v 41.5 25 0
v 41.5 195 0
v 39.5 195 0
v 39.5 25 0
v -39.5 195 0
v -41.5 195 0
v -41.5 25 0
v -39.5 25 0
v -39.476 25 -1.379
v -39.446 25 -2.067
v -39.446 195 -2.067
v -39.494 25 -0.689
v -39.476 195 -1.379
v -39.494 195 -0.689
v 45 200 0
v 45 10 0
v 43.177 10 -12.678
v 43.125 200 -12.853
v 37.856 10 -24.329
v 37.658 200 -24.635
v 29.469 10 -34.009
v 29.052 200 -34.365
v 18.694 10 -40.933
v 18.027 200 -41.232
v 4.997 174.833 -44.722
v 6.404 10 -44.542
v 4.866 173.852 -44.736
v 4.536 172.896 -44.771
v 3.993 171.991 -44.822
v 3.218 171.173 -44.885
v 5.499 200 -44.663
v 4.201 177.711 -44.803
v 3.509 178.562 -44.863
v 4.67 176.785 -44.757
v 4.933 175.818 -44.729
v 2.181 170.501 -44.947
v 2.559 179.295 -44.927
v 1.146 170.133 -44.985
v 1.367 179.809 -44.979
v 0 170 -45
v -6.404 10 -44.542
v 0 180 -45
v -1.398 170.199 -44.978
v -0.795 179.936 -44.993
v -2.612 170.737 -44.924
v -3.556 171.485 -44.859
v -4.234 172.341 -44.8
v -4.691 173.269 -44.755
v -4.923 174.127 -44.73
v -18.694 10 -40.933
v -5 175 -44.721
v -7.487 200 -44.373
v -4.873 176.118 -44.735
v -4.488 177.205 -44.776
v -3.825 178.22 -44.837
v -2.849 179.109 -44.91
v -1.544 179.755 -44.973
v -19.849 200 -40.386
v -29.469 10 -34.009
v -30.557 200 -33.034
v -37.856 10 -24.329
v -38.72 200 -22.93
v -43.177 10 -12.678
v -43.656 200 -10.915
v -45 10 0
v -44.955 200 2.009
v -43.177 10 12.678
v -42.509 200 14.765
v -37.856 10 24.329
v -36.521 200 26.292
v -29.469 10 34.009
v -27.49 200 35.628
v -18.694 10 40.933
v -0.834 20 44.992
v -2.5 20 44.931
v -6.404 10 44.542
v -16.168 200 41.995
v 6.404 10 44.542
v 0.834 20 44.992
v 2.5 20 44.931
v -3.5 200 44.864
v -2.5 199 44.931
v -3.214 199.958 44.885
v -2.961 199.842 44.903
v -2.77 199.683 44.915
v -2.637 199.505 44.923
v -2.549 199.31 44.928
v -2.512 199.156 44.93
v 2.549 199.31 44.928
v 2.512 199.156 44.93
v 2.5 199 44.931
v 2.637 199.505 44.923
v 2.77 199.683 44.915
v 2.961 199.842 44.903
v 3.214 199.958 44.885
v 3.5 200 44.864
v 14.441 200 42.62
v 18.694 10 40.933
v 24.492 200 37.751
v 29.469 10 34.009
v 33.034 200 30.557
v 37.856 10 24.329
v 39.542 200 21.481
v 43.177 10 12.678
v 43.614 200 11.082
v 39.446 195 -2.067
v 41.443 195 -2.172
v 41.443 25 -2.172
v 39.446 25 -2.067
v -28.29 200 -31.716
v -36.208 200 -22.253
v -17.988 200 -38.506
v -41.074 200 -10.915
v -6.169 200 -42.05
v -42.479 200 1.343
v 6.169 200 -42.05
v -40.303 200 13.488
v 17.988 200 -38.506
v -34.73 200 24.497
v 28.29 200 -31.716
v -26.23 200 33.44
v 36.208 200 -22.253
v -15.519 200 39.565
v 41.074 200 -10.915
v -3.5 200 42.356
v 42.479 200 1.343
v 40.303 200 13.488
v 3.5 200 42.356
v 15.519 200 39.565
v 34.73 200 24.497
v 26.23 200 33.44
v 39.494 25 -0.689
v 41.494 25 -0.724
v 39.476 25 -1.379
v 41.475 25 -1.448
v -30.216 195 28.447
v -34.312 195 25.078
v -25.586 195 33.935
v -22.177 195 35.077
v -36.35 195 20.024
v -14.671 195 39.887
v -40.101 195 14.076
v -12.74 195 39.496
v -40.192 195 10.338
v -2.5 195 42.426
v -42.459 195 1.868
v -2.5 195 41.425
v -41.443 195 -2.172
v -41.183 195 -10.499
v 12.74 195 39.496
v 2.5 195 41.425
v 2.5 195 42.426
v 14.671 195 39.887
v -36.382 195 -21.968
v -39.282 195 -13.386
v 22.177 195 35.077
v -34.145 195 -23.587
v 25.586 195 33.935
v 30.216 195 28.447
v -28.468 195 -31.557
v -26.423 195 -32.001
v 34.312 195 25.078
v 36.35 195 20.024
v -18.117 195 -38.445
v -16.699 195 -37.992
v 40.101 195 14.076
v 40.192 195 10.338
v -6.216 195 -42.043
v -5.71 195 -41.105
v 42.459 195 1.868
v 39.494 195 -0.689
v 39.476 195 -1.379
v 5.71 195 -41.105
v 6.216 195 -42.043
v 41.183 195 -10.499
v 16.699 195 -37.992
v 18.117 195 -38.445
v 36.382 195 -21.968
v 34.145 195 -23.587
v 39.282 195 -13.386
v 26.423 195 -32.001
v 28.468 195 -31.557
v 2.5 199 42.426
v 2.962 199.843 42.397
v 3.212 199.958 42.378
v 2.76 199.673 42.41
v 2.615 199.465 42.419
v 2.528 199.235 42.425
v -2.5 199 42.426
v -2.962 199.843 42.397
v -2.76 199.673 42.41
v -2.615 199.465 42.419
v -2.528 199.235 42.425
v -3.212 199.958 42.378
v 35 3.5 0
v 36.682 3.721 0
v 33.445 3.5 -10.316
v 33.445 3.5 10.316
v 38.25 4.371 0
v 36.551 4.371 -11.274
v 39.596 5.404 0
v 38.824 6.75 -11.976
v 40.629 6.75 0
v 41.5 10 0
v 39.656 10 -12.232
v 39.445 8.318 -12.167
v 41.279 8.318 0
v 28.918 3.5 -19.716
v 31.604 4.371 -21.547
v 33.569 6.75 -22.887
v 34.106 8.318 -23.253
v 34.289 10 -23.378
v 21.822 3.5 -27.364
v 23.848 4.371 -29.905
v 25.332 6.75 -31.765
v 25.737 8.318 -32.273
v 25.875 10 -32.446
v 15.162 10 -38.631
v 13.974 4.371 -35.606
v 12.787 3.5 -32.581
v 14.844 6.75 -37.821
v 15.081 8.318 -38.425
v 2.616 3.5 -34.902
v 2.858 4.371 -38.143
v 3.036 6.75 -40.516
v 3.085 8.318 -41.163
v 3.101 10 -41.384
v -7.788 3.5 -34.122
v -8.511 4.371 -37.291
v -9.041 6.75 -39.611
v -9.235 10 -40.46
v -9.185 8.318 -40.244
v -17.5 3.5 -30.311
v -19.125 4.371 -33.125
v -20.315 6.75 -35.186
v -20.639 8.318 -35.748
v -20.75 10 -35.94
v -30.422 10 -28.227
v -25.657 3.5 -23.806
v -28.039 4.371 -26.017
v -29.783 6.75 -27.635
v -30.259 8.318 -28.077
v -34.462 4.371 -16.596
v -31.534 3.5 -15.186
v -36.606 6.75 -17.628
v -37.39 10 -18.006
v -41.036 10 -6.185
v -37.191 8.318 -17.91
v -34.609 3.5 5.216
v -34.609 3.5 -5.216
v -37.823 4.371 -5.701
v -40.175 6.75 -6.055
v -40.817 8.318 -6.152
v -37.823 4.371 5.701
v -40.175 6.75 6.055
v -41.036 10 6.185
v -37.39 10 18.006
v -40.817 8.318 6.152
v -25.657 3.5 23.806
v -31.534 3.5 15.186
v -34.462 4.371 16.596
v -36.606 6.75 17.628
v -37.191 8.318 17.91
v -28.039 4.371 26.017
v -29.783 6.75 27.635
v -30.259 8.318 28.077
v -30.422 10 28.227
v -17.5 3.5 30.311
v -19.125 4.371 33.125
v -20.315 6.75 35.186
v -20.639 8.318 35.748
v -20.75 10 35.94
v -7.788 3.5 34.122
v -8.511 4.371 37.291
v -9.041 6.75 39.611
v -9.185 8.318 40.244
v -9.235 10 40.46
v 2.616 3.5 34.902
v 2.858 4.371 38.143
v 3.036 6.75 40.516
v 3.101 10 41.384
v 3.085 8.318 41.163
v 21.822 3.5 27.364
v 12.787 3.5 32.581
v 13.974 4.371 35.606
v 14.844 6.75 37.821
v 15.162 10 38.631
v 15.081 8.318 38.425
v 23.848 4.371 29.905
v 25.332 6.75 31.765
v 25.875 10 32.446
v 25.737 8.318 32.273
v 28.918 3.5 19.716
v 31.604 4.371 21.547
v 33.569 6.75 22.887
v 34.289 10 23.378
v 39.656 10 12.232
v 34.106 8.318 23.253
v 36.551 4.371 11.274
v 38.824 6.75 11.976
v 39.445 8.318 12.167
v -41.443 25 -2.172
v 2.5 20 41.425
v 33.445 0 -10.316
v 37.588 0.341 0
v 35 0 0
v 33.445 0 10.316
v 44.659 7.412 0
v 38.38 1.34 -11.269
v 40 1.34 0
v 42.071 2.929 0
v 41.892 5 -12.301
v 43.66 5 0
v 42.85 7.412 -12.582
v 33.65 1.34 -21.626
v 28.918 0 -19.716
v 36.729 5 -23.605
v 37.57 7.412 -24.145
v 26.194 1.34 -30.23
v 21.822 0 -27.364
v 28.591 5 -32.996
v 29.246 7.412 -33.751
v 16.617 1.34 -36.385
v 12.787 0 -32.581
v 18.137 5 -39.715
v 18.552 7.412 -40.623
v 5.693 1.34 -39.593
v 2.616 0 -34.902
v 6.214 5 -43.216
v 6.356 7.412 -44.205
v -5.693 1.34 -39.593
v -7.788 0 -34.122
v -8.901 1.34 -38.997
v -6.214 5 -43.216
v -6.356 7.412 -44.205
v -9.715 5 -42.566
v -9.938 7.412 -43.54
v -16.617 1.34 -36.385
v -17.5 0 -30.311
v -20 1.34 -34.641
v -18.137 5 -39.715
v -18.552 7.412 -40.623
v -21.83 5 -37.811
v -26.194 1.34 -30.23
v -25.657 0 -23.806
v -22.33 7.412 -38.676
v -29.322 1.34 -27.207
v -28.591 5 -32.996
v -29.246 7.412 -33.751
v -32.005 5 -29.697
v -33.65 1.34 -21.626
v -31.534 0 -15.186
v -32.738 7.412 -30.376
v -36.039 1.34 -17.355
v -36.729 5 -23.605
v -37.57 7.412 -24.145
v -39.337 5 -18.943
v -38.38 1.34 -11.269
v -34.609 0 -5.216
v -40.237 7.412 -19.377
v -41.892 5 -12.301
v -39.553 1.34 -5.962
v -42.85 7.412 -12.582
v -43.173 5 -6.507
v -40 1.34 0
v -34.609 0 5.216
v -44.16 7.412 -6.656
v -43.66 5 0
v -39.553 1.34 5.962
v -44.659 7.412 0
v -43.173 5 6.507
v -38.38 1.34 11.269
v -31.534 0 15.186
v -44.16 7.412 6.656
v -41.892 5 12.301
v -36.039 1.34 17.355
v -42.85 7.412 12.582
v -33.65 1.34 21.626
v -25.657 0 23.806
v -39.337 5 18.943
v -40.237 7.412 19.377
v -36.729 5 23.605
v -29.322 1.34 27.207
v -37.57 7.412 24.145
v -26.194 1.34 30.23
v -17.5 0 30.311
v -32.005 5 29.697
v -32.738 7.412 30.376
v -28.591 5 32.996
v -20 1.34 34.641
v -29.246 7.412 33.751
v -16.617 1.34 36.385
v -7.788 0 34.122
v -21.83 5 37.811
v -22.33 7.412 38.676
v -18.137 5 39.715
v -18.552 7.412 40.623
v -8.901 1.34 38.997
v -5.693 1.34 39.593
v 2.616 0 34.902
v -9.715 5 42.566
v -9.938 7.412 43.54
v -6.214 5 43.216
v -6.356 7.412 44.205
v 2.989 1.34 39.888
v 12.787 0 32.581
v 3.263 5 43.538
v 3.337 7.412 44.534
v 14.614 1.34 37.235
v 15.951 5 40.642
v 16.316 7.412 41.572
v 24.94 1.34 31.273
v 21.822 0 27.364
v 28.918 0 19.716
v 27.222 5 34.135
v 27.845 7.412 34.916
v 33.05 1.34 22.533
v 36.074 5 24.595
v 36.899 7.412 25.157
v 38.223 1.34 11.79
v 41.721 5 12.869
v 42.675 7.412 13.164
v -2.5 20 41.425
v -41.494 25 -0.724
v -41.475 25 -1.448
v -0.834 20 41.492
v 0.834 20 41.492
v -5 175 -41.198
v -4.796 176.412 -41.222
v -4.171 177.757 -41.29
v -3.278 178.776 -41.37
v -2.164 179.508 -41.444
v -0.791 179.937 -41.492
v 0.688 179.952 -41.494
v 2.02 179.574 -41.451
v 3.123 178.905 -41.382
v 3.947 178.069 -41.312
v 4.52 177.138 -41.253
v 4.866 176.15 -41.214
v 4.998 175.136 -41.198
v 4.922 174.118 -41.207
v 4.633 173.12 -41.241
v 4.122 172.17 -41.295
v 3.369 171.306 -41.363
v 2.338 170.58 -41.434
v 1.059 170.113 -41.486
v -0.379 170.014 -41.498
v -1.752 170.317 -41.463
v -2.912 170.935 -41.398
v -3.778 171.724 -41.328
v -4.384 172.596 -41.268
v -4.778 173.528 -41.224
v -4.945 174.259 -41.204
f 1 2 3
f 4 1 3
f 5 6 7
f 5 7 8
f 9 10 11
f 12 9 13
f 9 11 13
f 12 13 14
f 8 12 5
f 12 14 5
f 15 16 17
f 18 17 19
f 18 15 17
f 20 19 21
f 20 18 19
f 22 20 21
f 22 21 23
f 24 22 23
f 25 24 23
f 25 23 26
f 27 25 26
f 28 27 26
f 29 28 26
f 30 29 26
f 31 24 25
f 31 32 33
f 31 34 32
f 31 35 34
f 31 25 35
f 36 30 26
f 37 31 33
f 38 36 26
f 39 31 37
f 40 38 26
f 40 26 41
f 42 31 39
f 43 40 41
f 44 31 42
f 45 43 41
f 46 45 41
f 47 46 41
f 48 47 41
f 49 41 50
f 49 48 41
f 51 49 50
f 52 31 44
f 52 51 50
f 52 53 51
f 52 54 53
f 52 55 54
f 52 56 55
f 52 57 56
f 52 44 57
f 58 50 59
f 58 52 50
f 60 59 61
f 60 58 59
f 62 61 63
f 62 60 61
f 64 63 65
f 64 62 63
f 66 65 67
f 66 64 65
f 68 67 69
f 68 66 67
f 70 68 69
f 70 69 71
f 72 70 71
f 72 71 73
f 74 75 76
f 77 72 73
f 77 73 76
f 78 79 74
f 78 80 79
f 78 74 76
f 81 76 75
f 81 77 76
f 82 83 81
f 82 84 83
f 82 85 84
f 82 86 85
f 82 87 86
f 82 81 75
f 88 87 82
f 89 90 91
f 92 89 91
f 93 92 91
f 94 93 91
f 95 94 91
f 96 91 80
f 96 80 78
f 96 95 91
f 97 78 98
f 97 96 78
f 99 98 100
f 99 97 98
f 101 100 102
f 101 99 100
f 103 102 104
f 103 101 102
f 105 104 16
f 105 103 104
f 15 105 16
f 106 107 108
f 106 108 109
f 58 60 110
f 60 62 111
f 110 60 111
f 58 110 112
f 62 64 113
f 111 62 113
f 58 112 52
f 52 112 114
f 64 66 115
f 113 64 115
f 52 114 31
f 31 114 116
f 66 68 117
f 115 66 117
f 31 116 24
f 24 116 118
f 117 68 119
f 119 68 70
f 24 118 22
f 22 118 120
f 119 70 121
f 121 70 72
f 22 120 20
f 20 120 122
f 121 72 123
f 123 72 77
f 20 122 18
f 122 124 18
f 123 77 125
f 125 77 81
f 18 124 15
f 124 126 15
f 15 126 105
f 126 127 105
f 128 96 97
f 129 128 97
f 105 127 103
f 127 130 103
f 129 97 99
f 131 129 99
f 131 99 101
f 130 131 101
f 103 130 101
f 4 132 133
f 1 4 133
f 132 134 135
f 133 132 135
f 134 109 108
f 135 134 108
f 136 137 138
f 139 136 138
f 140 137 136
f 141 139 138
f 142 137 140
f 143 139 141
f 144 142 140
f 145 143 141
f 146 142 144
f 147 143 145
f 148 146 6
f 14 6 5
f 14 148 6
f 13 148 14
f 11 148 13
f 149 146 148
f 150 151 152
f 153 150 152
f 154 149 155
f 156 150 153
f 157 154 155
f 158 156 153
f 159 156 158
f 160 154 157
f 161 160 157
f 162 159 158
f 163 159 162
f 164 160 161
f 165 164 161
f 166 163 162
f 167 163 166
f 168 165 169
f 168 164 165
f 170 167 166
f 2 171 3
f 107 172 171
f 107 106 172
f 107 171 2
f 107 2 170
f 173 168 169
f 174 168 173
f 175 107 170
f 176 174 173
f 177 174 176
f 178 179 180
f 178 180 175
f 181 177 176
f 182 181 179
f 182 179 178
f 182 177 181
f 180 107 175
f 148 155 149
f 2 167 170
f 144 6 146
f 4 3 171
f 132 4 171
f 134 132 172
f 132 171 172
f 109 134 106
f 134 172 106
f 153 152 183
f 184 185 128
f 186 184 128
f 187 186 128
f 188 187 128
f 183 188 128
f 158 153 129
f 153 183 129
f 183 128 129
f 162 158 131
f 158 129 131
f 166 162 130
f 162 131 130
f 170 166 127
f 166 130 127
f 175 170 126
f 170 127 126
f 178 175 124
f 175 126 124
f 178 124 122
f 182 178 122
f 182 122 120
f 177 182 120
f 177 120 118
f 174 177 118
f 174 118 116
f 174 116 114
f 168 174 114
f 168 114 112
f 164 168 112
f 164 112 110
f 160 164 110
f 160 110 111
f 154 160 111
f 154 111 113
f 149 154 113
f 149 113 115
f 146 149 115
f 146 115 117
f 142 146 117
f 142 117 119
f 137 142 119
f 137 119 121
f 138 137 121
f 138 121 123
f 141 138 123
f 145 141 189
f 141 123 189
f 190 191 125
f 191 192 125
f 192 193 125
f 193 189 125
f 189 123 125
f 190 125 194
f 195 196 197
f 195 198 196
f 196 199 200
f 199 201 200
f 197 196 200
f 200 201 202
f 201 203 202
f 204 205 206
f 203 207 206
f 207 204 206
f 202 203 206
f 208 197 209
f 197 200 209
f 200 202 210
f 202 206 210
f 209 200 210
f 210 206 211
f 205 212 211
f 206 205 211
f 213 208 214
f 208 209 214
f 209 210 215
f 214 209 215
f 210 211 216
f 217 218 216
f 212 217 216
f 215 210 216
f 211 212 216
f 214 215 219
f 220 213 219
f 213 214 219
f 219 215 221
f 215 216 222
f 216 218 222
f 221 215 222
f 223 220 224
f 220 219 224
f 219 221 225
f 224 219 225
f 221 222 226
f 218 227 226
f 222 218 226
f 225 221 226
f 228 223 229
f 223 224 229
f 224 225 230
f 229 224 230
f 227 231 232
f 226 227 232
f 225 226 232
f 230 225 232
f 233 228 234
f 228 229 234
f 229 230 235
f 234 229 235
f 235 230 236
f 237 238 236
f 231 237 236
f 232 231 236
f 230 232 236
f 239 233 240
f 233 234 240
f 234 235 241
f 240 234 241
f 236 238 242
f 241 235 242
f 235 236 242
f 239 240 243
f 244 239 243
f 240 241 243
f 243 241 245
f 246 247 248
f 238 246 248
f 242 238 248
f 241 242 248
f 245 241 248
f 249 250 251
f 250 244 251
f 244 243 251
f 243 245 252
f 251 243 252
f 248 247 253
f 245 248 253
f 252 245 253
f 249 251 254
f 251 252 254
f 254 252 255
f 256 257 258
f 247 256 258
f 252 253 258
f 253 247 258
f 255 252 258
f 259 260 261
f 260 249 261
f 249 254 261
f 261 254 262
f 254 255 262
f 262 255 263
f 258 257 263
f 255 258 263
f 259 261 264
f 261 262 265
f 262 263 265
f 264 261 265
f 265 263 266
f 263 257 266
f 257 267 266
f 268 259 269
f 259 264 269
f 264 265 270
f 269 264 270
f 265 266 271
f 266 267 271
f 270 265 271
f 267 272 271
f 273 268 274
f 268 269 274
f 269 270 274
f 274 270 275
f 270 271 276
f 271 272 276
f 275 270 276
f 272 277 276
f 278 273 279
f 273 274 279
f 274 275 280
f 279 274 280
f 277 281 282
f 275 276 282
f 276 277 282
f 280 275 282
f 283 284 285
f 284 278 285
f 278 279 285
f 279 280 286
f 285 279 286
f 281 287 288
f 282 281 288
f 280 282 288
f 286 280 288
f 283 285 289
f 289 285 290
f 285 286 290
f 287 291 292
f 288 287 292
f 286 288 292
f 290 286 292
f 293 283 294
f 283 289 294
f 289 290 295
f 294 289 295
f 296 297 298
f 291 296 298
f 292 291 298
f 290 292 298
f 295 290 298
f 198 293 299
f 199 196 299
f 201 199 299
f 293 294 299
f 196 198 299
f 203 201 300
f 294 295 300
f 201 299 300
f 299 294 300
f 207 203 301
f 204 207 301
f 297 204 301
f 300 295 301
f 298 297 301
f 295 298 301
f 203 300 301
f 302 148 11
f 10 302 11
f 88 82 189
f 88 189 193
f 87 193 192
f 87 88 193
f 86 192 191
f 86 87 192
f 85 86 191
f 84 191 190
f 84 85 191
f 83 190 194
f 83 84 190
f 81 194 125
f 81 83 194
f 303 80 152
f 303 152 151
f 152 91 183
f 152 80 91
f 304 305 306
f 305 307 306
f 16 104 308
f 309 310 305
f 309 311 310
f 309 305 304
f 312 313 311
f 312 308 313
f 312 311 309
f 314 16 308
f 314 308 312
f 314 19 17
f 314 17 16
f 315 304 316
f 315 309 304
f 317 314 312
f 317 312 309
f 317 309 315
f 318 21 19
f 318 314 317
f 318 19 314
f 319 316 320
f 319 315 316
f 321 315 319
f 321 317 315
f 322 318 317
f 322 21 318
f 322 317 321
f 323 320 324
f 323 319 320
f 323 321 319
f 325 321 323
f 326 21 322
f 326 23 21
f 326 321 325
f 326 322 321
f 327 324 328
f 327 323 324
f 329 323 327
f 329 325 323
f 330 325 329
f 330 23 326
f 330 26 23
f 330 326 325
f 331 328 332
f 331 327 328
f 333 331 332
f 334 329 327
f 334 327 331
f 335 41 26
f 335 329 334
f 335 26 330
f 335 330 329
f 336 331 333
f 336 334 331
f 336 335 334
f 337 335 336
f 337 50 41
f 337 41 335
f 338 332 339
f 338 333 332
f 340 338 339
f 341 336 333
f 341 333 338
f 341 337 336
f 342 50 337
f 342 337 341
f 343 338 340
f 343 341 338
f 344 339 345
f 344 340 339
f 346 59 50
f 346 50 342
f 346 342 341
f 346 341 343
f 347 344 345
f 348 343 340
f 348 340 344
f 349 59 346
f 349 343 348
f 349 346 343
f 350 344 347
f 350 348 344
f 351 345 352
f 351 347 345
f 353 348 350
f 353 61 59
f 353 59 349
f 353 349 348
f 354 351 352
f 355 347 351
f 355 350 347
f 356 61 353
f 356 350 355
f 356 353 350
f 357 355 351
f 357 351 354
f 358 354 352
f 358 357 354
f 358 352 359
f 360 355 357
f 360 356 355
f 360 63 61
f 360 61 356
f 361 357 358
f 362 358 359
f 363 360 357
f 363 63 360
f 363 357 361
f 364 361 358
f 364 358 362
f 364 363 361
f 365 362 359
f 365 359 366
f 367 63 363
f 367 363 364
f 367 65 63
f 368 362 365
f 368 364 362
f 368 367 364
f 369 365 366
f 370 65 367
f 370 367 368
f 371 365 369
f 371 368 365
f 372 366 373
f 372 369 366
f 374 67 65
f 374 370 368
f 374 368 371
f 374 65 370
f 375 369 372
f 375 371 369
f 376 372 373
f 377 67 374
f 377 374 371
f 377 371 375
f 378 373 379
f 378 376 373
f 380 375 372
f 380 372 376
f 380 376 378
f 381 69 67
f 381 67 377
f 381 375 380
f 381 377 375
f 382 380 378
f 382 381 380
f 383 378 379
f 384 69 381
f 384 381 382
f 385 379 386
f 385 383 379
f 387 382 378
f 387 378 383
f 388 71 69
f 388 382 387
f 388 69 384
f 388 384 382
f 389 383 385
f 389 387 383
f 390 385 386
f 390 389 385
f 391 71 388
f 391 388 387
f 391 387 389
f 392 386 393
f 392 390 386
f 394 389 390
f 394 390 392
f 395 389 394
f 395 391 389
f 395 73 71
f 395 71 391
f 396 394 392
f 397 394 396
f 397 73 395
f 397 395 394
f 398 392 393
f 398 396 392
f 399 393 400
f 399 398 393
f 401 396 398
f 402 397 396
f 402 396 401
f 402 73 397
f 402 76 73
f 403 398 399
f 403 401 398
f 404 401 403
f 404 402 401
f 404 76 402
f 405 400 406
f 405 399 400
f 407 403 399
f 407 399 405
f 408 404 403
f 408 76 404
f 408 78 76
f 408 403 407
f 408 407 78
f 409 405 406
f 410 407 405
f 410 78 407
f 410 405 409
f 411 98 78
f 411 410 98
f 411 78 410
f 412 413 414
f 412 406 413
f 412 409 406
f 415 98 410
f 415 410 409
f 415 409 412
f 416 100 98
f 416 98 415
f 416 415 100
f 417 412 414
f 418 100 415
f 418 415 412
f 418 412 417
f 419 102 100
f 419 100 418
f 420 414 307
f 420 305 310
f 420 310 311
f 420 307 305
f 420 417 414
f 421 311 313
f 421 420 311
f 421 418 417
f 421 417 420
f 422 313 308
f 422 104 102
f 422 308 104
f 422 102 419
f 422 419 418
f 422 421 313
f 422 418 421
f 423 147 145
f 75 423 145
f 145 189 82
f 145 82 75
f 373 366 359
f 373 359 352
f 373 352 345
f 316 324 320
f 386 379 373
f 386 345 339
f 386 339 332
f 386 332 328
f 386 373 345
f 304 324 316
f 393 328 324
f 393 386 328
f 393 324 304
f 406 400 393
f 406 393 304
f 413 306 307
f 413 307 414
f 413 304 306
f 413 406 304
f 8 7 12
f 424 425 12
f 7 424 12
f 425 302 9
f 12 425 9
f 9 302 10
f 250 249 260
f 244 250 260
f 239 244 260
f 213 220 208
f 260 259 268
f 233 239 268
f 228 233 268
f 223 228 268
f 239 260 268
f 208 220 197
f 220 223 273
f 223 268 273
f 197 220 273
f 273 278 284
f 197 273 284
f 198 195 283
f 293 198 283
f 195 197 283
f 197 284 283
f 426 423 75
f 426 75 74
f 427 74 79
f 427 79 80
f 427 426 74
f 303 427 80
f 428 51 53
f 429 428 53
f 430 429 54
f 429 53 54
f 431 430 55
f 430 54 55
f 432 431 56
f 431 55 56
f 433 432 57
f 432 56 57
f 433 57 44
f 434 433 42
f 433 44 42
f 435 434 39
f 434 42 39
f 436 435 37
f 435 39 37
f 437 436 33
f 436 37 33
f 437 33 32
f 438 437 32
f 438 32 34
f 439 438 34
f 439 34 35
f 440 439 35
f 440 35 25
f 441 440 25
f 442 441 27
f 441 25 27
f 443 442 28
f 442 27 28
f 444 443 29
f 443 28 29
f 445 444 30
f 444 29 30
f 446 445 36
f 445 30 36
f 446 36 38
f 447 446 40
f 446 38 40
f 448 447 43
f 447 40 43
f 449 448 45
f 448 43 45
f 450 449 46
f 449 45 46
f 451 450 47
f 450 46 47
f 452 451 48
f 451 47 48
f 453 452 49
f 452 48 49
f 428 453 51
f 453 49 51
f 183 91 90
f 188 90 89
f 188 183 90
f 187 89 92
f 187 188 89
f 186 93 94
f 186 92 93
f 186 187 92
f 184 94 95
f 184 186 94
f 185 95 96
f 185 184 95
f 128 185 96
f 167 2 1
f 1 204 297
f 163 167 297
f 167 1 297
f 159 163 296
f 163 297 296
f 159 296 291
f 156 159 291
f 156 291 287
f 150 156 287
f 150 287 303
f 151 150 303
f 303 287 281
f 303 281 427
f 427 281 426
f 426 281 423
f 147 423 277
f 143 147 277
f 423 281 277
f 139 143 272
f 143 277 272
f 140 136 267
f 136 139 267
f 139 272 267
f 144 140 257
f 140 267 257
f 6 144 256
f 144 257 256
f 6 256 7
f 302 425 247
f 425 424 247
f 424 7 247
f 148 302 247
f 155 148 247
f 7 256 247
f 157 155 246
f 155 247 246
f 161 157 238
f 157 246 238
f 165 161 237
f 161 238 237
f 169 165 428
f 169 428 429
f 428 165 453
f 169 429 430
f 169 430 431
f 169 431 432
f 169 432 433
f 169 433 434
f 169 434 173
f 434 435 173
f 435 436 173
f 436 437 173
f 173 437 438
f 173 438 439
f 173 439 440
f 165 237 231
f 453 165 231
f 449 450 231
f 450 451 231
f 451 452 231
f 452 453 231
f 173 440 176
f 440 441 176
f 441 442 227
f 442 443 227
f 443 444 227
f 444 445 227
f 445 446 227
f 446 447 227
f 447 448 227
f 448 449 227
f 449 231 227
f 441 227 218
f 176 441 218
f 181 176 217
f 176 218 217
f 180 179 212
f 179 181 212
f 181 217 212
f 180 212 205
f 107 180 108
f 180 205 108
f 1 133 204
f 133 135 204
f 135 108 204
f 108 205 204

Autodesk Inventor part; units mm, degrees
ref_plane "YZ Plane" through (0, 0, 0) normal (1, 0, 0) x (0, 1, 0)
ref_plane "XZ Plane" through (0, 0, 0) normal (0, 1, 0) x (-1, 0, 0)
sketch "Sketch1" plane through (0, 0, 0) normal (0, 0, 1) x (1, 0, 0)
  line L0 (0, 0) -> (35, 0)
  line L1 (45, 10) -> (45, 200)
  line L2 (0, 200) -> (0, 0)
  arc A0 (35, 0) -> (45, 10) centre (35, 10) ccw
  line L3 (41.5, 200) -> (41.5, 10)
  arc A1 (35, 3.5) -> (41.5, 10) centre (35, 10) ccw
  line L4 (35, 3.5) -> (0, 3.5)
  line L5 (41.5, 200) -> (45, 200)
  line L6 (0, 3.5) -> (0, 0)
  point P0 (45, 0)
  dimension "d0" = 90
  dimension "d1" = 200
  dimension "d2" = 10
  dimension "d5" = 3.5
  dimension "d6" = 3.5
revolve "Revolution1" add sketch "Sketch1" angle 360 about axis through (0, 200, 0) along (0, -1, 0)
sketch "Sketch2" plane through (0, 200, 0) normal (0, 1, 0) x (1, 0, 0)
  circle A0 centre (0, 0) radius 45 construction
  line L0 (0, 45) -> (0, -45) construction
  line L1 (-45, 0) -> (45, 0) construction
  circle A1 centre (0, 0) radius 45 construction
  circle A2 centre (0, 0) radius 41.5 construction
  circle A3 centre (0, 0) radius 41.5 construction
  circle A4 centre (0, 0) radius 45 construction
  line L2 (0, -41.5) -> (0, -45) construction
  line L3 (-2.5, -45.45) -> (2.5, -45.45)
  line L4 (2.5, -45.45) -> (2.5, -41.05)
  line L5 (2.5, -41.05) -> (-2.5, -41.05)
  line L6 (-2.5, -41.05) -> (-2.5, -45.45)
  line L7 (-2.5, -45.45) -> (2.5, -41.05) construction
  line L8 (2.5, -45.45) -> (-2.5, -41.05) construction
  point P0 (0, -43.25)
  dimension "d8" = 5
  dimension "d9" = 4.4
extrude "Extrusion1" cut sketch "Sketch2" against normal blind 180
fillet "Fillet1" radius 1 2 edges at (-2.5, 200, 43.1776) (2.5, 200, 43.1776)
sketch "Sketch3" plane through (0, 200, 0) normal (0, 1, 0) x (1, 0, 0)
  arc A0 (3.5, -41.3521) -> (-3.5, -41.3521) centre (0, 0) ccw projected
  circle A1 centre (0, 0) radius 42.5
  circle A2 centre (0, 0) radius 41.5
  point P0 (3.5, -41.3521)
  point P1 (-3.5, -41.3521)
  dimension "d13" = 85
extrude "Extrusion2" cut sketch "Sketch3" against normal blind 5
ref_plane "Work Plane1" through (0, 200, -45) normal (0, 0, -1) x (-1, 0, 0)
sketch "Sketch4" plane through (0, 200, -45) normal (0, 0, -1) x (-1, 0, 0)
  line L0 (-45, 0) -> (45, 0) construction
  line L1 (0, 0) -> (0, -25) construction
  circle A0 centre (0, -25) radius 5
  point P0 (0, -200)
  point P1 (3.5, 0)
  point P2 (-3.5, 0)
  dimension "d16" = 25
  dimension "d17" = 10
extrude "Extrusion3" cut sketch "Sketch4" against normal up to surface
sketch "Sketch5" plane through (0, 195, 0) normal (0, 1, 0) x (1, 0, 0)
  line L0 (2.5, -42.4264) -> (2.5, -41.4246) construction
  arc A0 (2.5, -42.4264) -> (-2.5, -42.4264) centre (0, 0) ccw construction
  line L1 (-2.5, -41.4246) -> (-2.5, -42.4264) construction
  arc A1 (2.5, -41.4246) -> (-2.5, -41.4246) centre (0, 0) ccw projected
  arc A2 (2.5, -41.4246) -> (-2.5, -41.4246) centre (0, 0) ccw construction
  line L2 (41.5, 0) -> (-41.5, 0) construction
  line L3 (41.5, 0) -> (39.5, 0)
  arc A3 (39.5, 0) -> (39.4459, 2.0673) centre (0, 0) ccw
  line L4 (41.5, 0) -> (39.5, 0)
  line L5 (0, 0) -> (41.5, 0) construction
  line L6 (0, 0) -> (41.4431, 2.1719) construction
  line L7 (41.4431, 2.1719) -> (39.4459, 2.0673)
  line L8 (0, 41.5) -> (0, -41.5) construction
  arc A4 (41.5, 0) -> (41.4431, 2.1719) centre (0, 0) ccw
  arc A5 (-2.5, -41.4246) -> (2.5, -41.4246) centre (0, 0) ccw
  line L9 (-41.5, 0) -> (-39.5, 0)
  arc A6 (-39.4459, 2.0673) -> (-39.5, 0) centre (0, 0) ccw
  line L10 (-41.4431, 2.1719) -> (-39.4459, 2.0673)
  arc A7 (-41.4431, 2.1719) -> (-41.5, 0) centre (0, 0) ccw
  point P0 (-41.5, 0)
  dimension "d20" = 2
  dimension "d21" = 3
extrude "Extrusion4" add sketch "Sketch5" against normal blind 170 contours L3 A3 L7 A1 | A1 L10 A6 L9
properties part number "_3DPrint"
